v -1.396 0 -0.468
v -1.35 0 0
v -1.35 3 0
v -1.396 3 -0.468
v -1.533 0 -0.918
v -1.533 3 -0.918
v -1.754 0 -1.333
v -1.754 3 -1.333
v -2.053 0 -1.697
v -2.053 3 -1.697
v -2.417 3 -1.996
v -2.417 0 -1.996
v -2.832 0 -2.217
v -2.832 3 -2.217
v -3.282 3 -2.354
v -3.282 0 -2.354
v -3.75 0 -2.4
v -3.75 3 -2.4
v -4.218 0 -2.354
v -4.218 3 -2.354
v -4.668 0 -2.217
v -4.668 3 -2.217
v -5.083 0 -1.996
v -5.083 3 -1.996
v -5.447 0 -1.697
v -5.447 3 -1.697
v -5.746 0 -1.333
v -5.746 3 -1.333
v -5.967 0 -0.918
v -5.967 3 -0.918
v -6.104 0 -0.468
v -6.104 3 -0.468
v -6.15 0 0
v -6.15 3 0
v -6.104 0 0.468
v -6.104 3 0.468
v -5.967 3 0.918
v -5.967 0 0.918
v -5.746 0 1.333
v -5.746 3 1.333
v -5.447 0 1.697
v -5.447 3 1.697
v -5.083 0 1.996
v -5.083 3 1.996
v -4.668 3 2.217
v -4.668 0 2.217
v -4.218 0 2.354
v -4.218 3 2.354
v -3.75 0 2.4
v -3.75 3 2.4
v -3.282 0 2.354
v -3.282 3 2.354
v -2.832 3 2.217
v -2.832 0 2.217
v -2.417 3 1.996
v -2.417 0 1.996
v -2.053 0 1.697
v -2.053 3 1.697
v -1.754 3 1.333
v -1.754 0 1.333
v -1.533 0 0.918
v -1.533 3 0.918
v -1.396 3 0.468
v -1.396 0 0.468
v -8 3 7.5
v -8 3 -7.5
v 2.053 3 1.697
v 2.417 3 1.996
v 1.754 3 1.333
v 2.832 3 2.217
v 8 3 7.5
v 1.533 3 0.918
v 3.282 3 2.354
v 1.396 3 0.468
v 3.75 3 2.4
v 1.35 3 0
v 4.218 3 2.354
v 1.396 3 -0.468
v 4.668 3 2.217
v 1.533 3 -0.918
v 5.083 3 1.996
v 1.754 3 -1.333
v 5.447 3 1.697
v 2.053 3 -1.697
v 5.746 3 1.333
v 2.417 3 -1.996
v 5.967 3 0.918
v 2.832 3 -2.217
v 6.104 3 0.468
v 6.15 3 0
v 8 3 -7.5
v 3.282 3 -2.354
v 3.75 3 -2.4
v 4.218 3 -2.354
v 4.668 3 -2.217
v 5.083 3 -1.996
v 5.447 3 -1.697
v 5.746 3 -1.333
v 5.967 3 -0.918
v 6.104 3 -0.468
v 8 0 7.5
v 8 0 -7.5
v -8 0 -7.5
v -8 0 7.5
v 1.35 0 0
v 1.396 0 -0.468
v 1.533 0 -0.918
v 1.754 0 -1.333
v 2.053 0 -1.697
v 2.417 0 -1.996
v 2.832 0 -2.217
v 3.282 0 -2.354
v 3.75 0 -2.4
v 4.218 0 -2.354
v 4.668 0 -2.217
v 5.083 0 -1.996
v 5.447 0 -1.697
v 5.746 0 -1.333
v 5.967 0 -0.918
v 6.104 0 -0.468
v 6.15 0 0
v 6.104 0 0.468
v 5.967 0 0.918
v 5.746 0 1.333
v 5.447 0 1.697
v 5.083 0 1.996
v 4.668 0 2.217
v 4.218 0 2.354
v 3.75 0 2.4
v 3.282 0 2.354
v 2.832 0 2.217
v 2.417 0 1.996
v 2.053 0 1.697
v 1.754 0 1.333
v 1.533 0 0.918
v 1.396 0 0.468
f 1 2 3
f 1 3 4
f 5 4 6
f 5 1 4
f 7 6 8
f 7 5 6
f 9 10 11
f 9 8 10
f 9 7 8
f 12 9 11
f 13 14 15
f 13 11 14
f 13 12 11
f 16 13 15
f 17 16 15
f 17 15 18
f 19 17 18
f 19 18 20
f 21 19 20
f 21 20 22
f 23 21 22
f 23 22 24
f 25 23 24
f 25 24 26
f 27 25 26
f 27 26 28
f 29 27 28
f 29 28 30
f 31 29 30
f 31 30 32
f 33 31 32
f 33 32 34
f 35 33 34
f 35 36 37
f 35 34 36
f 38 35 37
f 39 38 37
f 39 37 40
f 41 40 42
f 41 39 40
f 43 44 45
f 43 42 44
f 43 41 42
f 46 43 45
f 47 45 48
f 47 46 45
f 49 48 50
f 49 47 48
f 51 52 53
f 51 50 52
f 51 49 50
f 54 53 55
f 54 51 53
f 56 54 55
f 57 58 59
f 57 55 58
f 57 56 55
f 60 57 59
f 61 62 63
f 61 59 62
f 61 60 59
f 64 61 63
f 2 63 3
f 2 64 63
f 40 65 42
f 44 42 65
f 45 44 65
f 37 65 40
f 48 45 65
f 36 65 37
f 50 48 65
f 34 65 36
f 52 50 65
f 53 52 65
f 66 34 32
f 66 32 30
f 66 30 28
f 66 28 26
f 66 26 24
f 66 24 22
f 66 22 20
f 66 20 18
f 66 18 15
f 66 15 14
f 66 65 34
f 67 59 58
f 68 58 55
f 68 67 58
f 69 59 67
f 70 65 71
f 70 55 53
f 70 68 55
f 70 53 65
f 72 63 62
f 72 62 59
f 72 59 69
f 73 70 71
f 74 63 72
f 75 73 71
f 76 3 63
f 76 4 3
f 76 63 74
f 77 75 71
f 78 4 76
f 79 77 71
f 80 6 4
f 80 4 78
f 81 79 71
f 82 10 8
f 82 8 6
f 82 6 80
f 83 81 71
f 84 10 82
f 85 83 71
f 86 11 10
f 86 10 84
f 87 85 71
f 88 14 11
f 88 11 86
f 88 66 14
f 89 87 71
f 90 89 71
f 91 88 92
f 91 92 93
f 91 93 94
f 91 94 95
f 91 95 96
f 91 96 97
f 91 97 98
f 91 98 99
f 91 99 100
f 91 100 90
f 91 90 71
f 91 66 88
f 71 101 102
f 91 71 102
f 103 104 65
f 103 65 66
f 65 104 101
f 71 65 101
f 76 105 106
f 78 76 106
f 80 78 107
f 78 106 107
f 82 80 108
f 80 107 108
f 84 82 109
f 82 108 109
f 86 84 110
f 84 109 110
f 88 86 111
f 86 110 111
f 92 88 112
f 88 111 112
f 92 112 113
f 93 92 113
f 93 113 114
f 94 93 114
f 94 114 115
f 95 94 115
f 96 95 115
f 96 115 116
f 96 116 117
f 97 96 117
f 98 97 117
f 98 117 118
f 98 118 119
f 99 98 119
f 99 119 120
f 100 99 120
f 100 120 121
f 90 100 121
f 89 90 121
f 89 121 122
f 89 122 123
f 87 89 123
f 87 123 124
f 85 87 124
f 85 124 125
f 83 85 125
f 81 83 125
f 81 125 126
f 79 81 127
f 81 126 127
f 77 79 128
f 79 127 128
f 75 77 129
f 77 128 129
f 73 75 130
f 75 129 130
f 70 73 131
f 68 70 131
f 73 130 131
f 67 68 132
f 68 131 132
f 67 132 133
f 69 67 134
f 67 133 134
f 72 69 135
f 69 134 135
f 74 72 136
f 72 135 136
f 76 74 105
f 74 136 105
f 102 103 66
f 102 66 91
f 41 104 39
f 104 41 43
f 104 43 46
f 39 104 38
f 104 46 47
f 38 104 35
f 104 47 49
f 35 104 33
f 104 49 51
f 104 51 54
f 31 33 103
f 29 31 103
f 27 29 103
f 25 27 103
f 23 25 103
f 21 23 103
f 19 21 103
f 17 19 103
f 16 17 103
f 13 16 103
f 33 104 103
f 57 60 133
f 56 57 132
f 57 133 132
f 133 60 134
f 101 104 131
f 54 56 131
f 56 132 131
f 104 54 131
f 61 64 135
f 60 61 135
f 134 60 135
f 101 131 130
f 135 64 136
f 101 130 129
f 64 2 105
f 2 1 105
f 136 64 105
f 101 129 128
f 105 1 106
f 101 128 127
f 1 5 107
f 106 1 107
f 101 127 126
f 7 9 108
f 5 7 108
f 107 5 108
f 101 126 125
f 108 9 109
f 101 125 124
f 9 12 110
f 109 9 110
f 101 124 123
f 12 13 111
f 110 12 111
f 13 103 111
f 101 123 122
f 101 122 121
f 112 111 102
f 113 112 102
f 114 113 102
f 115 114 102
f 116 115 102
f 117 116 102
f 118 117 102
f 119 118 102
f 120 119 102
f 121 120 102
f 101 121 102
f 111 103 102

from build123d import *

# Parameters (mm, degrees)
SKETCH1_W           = 16
SKETCH1_H           = 15
BOSS_EXTRUDE1_DEPTH = 3
CUT_EXTRUDE1_START  = -4
SKETCH2_R           = 2.4
CUT_EXTRUDE1_DEPTH  = 5


with BuildPart() as part:
    # Sketch1 → Boss-Extrude1 (new body)
    with BuildSketch(Plane(origin=(0, 0, 0), x_dir=(1, 0, 0), z_dir=(0, 1, 0))):
        Rectangle(SKETCH1_W, SKETCH1_H)
    extrude(amount=BOSS_EXTRUDE1_DEPTH)

    # Sketch2 → Cut-Extrude1 (cut)
    with BuildSketch(Plane(origin=(0, 3, 0), x_dir=(1, 0, 0), z_dir=(0, 1, 0)).offset(CUT_EXTRUDE1_START)):
        with Locations((-3.75, 0)):
            Circle(SKETCH2_R)
    cut_extrude1 = extrude(amount=CUT_EXTRUDE1_DEPTH, mode=Mode.SUBTRACT)

    # Mirror1: Cut-Extrude1 across plane
    add(cut_extrude1.mirror(Plane(origin=(0, 0, 0), x_dir=(0, 0, 1), z_dir=(1, 0, 0))), mode=Mode.SUBTRACT)


solid = part.part
